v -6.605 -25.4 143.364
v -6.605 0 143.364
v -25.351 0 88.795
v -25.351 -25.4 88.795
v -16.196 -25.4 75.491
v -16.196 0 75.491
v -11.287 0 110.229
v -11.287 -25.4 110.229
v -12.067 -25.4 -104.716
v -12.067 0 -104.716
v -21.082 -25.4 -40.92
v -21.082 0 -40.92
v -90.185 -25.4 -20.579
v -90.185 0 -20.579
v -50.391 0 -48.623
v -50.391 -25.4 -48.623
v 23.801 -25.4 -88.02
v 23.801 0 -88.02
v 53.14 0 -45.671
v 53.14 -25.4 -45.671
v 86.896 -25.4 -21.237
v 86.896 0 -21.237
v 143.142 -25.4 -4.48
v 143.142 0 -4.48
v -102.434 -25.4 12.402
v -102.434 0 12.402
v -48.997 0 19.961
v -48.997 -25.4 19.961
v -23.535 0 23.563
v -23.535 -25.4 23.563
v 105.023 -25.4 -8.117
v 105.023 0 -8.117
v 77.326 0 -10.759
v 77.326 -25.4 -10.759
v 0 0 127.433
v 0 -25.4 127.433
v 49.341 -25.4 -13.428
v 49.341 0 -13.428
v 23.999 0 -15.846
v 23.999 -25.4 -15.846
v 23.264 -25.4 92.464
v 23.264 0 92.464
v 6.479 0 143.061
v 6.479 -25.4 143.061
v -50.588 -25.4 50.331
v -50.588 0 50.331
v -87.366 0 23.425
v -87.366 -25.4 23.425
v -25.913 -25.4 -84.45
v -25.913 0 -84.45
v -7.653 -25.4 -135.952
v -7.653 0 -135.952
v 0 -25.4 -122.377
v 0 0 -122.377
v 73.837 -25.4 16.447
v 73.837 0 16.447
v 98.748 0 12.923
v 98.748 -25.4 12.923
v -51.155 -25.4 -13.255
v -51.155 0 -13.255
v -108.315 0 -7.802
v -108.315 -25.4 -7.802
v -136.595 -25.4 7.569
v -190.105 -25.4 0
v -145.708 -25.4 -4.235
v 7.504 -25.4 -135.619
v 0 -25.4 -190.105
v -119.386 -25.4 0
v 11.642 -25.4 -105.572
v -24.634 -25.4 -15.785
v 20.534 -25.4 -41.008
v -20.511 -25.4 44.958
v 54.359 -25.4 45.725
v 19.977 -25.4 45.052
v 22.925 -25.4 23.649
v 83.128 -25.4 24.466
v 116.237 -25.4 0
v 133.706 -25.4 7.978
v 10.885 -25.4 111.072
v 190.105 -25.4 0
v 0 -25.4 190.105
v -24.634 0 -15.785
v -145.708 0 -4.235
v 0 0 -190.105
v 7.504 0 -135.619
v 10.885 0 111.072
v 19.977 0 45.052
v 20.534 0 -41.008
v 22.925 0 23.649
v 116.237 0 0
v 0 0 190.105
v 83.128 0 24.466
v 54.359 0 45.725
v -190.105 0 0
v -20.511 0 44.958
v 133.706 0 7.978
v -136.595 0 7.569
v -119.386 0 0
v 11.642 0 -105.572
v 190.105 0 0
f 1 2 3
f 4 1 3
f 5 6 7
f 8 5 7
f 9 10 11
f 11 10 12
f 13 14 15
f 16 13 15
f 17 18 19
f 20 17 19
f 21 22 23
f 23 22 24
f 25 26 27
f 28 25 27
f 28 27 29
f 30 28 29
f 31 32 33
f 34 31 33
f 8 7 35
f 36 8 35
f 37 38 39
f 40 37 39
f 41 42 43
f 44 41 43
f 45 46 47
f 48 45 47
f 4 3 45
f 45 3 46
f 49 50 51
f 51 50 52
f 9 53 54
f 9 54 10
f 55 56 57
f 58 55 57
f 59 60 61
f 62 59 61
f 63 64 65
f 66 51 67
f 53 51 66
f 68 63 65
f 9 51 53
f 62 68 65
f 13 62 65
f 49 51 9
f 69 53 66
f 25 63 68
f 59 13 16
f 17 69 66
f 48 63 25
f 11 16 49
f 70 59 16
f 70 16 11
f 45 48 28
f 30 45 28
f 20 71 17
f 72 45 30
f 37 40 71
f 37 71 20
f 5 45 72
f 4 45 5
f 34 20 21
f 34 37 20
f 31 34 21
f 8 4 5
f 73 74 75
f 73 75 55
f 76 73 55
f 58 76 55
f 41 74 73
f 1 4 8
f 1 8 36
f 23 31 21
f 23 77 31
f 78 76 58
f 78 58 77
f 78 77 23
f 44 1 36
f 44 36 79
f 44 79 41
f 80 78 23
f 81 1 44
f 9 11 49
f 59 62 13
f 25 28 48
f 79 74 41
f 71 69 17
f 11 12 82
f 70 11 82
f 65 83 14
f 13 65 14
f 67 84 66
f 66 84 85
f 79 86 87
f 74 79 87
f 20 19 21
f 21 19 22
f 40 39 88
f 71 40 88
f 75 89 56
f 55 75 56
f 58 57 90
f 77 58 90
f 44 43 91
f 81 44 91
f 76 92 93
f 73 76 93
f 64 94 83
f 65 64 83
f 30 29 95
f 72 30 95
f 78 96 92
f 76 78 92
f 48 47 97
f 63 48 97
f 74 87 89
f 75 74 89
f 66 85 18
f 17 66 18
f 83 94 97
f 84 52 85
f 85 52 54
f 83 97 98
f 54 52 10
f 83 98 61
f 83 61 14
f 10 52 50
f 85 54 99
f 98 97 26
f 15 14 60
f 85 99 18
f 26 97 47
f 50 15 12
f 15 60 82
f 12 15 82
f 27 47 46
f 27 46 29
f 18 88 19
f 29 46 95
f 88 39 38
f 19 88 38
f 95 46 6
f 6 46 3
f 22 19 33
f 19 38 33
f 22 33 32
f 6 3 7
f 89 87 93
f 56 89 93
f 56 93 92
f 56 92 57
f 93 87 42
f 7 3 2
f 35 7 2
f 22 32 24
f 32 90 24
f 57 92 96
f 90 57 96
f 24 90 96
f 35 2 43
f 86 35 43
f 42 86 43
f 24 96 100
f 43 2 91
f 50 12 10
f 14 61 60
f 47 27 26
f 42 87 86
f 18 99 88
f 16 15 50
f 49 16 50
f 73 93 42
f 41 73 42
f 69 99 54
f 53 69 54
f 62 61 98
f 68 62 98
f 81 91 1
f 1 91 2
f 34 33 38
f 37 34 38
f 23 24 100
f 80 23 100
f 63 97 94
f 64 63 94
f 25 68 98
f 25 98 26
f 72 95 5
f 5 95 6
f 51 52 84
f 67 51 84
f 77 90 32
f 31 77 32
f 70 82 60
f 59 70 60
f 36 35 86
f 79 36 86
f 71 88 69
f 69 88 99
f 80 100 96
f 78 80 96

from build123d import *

# Parameters (mm, degrees)
F1_DEPTH = 25.4


with BuildPart() as f1:
    # F0 (on Front) → F1 (new body)
    with BuildSketch(Plane.XZ):
        Polygon((6.4789838679, 143.0610253916), (0, 190.1048020358), (-6.6051132214, 143.363907551), (0, 162.5912040472), align=None)
        Polygon((0, 162.5912040472), (-6.6051132214, 143.363907551), (-11.2874526005, 110.2294670761), (0, 127.4327933788), (10.8845930701, 111.0719821234), (6.4789838679, 143.0610253916), align=None)
        Polygon((-11.2874526005, 110.2294670761), (-6.6051132214, 143.363907551), (-25.3510719107, 88.7949556276), align=None)
        Polygon((23.2641081299, 92.464128984), (6.4789838679, 143.0610253916), (10.8845930701, 111.0719821234), align=None)
        Polygon((-16.1964657783, 75.4909759594), (-11.2874526005, 110.2294670761), (-25.3510719107, 88.7949556276), (-34.5284807194, 62.0797799271), align=None)
        Polygon((-34.5284807194, 62.0797799271), (-25.3510719107, 88.7949556276), (-50.5880084585, 50.3310727943), align=None)
        Polygon((23.2641081299, 92.464128984), (10.8845930701, 111.0719821234), (15.9783431129, 74.0863615106), (33.7067852385, 60.9858364417), align=None)
        Polygon((54.3591441951, 45.7246677317), (23.2641081299, 92.464128984), (33.7067852385, 60.9858364417), align=None)
        Polygon((-42.8858424978, 37.7517377794), (-34.5284807194, 62.0797799271), (-50.5880084585, 50.3310727943), (-63.1169358373, 31.2356016062), align=None)
        Polygon((-63.1169358373, 31.2356016062), (-50.5880084585, 50.3310727943), (-87.3659343428, 23.4253575589), align=None)
        Polygon((54.3591441951, 45.7246677317), (33.7067852385, 60.9858364417), (41.2983510128, 38.1019029624), (64.4518457344, 30.554161689), align=None)
        Polygon((83.1275046372, 24.4661372589), (54.3591441951, 45.7246677317), (64.4518457344, 30.554161689), align=None)
        Polygon((-72.7158875117, 16.6057374852), (-63.1169358373, 31.2356016062), (-87.3659343428, 23.4253575589), (-102.4342347336, 12.401804989), align=None)
        Polygon((-102.4342347336, 12.401804989), (-87.3659343428, 23.4253575589), (-136.5947303766, 7.5694898993), align=None)
        Polygon((83.1275046372, 24.4661372589), (64.4518457344, 30.554161689), (73.837026265, 16.4471421365), (98.7480565931, 12.92324866), align=None)
        Polygon((133.7063873813, 7.9780724792), (83.1275046372, 24.4661372589), (98.7480565931, 12.92324866), align=None)
        Polygon((-119.3864941597, 0), (-102.4342347336, 12.401804989), (-136.5947303766, 7.5694898993), (-160.0962430239, 0), (-145.7079445735, -4.2353132382), (-108.3147829025, -7.8024970817), align=None)
        Polygon((-160.0962430239, 0), (-136.5947303766, 7.5694898993), (-190.1048020358, 0), (-145.7079445735, -4.2353132382), align=None)
        Polygon((133.7063873813, 7.9780724792), (98.7480565931, 12.92324866), (116.2365972996, 0), (105.0231827748, -8.116504838), (143.1423881699, -4.4800588265), (158.1799685955, 0), align=None)
        Polygon((190.1048020358, 0), (133.7063873813, 7.9780724792), (158.1799685955, 0), (143.1423881699, -4.4800588265), align=None)
        Polygon((-64.3567517854, -28.1817016834), (-76.1863177081, -10.8674463087), (-108.3147829025, -7.8024970817), (-90.185094151, -20.5789180242), align=None)
        Polygon((-90.185094151, -20.5789180242), (-108.3147829025, -7.8024970817), (-145.7079445735, -4.2353132382), align=None)
        Polygon((105.0231827748, -8.116504838), (77.3257177694, -10.7587513145), (65.6897330033, -27.5550776524), (86.8962872603, -21.237132352), align=None)
        Polygon((143.1423881699, -4.4800588265), (105.0231827748, -8.116504838), (86.8962872603, -21.237132352), align=None)
        Polygon((-34.6929381596, -59.6855543086), (-43.7076647237, -34.2599292161), (-64.3567517854, -28.1817016834), (-50.3907510083, -48.6229338974), align=None)
        Polygon((-50.3907510083, -48.6229338974), (-64.3567517854, -28.1817016834), (-90.185094151, -20.5789180242), align=None)
        Polygon((65.6897330033, -27.5550776524), (42.0972347258, -34.58385337), (33.4121165087, -59.9500979433), (53.139639768, -45.6709024653), align=None)
        Polygon((86.8962872603, -21.237132352), (65.6897330033, -27.5550776524), (53.139639768, -45.6709024653), align=None)
        Polygon((-12.0666112155, -104.7157734591), (-16.6312789161, -72.4140332461), (-34.6929381596, -59.6855543086), (-25.9125275508, -84.4503019369), align=None)
        Polygon((-25.9125275508, -84.4503019369), (-34.6929381596, -59.6855543086), (-50.3907510083, -48.6229338974), align=None)
        Polygon((33.4121165087, -59.9500979433), (16.2104519289, -72.4010238832), (11.6420852362, -105.5718461452), (23.8011252741, -88.0204993073), align=None)
        Polygon((53.139639768, -45.6709024653), (33.4121165087, -59.9500979433), (23.8011252741, -88.0204993073), align=None)
        Polygon((-7.6525536308, -135.9517255008), (-12.0666112155, -104.7157734591), (-25.9125275508, -84.4503019369), align=None)
        Polygon((0, -122.3769783974), (-12.0666112155, -104.7157734591), (-7.6525536308, -135.9517255008), (0, -157.5354039669), (7.5039086249, -135.6190665407), (11.6420852362, -105.5718461452), align=None)
        Polygon((23.8011252741, -88.0204993073), (11.6420852362, -105.5718461452), (7.5039086249, -135.6190665407), align=None)
        Polygon((0, -157.5354039669), (-7.6525536308, -135.9517255008), (0, -190.1048020358), (7.5039086249, -135.6190665407), align=None)
        Polygon((-23.5345997346, 23.5628812437), (-20.5111412815, 44.9582983698), (-42.8858424978, 37.7517377794), (-48.9974841566, 19.9609229495), align=None)
        Polygon((-48.9974841566, 19.9609229495), (-42.8858424978, 37.7517377794), (-63.1169358373, 31.2356016062), (-72.7158875117, 16.6057374852), align=None)
        Polygon((-20.5111412815, 44.9582983698), (-16.1964657783, 75.4909759594), (-34.5284807194, 62.0797799271), (-42.8858424978, 37.7517377794), align=None)
        Polygon((-43.7076647237, -34.2599292161), (-51.1548930664, -13.2553613598), (-76.1863177081, -10.8674463087), (-64.3567517854, -28.1817016834), align=None)
        Polygon((-21.0818016053, -40.9200369363), (-24.6336619422, -15.7853990178), (-51.1548930664, -13.2553613598), (-43.7076647237, -34.2599292161), align=None)
        Polygon((-16.6312789161, -72.4140332461), (-21.0818016053, -40.9200369363), (-43.7076647237, -34.2599292161), (-34.6929381596, -59.6855543086), align=None)
        Polygon((42.0972347258, -34.58385337), (20.5339658906, -41.0080725688), (16.2104519289, -72.4010238832), (33.4121165087, -59.9500979433), align=None)
        Polygon((49.3406122431, -13.4284377447), (23.9993605016, -15.8459092755), (20.5339658906, -41.0080725688), (42.0972347258, -34.58385337), align=None)
        Polygon((33.7067852385, 60.9858364417), (15.9783431129, 74.0863615106), (19.9769714734, 45.0523982672), (41.2983510128, 38.1019029624), align=None)
        Polygon((41.2983510128, 38.1019029624), (19.9769714734, 45.0523982672), (22.9246777033, 23.6491603032), (47.2337087064, 20.2104251467), align=None)
        Polygon((64.4518457344, 30.554161689), (41.2983510128, 38.1019029624), (47.2337087064, 20.2104251467), (73.837026265, 16.4471421365), align=None)
        Polygon((77.3257177694, -10.7587513145), (49.3406122431, -13.4284377447), (42.0972347258, -34.58385337), (65.6897330033, -27.5550776524), align=None)
    extrude(amount=F1_DEPTH)


solid = f1.part
